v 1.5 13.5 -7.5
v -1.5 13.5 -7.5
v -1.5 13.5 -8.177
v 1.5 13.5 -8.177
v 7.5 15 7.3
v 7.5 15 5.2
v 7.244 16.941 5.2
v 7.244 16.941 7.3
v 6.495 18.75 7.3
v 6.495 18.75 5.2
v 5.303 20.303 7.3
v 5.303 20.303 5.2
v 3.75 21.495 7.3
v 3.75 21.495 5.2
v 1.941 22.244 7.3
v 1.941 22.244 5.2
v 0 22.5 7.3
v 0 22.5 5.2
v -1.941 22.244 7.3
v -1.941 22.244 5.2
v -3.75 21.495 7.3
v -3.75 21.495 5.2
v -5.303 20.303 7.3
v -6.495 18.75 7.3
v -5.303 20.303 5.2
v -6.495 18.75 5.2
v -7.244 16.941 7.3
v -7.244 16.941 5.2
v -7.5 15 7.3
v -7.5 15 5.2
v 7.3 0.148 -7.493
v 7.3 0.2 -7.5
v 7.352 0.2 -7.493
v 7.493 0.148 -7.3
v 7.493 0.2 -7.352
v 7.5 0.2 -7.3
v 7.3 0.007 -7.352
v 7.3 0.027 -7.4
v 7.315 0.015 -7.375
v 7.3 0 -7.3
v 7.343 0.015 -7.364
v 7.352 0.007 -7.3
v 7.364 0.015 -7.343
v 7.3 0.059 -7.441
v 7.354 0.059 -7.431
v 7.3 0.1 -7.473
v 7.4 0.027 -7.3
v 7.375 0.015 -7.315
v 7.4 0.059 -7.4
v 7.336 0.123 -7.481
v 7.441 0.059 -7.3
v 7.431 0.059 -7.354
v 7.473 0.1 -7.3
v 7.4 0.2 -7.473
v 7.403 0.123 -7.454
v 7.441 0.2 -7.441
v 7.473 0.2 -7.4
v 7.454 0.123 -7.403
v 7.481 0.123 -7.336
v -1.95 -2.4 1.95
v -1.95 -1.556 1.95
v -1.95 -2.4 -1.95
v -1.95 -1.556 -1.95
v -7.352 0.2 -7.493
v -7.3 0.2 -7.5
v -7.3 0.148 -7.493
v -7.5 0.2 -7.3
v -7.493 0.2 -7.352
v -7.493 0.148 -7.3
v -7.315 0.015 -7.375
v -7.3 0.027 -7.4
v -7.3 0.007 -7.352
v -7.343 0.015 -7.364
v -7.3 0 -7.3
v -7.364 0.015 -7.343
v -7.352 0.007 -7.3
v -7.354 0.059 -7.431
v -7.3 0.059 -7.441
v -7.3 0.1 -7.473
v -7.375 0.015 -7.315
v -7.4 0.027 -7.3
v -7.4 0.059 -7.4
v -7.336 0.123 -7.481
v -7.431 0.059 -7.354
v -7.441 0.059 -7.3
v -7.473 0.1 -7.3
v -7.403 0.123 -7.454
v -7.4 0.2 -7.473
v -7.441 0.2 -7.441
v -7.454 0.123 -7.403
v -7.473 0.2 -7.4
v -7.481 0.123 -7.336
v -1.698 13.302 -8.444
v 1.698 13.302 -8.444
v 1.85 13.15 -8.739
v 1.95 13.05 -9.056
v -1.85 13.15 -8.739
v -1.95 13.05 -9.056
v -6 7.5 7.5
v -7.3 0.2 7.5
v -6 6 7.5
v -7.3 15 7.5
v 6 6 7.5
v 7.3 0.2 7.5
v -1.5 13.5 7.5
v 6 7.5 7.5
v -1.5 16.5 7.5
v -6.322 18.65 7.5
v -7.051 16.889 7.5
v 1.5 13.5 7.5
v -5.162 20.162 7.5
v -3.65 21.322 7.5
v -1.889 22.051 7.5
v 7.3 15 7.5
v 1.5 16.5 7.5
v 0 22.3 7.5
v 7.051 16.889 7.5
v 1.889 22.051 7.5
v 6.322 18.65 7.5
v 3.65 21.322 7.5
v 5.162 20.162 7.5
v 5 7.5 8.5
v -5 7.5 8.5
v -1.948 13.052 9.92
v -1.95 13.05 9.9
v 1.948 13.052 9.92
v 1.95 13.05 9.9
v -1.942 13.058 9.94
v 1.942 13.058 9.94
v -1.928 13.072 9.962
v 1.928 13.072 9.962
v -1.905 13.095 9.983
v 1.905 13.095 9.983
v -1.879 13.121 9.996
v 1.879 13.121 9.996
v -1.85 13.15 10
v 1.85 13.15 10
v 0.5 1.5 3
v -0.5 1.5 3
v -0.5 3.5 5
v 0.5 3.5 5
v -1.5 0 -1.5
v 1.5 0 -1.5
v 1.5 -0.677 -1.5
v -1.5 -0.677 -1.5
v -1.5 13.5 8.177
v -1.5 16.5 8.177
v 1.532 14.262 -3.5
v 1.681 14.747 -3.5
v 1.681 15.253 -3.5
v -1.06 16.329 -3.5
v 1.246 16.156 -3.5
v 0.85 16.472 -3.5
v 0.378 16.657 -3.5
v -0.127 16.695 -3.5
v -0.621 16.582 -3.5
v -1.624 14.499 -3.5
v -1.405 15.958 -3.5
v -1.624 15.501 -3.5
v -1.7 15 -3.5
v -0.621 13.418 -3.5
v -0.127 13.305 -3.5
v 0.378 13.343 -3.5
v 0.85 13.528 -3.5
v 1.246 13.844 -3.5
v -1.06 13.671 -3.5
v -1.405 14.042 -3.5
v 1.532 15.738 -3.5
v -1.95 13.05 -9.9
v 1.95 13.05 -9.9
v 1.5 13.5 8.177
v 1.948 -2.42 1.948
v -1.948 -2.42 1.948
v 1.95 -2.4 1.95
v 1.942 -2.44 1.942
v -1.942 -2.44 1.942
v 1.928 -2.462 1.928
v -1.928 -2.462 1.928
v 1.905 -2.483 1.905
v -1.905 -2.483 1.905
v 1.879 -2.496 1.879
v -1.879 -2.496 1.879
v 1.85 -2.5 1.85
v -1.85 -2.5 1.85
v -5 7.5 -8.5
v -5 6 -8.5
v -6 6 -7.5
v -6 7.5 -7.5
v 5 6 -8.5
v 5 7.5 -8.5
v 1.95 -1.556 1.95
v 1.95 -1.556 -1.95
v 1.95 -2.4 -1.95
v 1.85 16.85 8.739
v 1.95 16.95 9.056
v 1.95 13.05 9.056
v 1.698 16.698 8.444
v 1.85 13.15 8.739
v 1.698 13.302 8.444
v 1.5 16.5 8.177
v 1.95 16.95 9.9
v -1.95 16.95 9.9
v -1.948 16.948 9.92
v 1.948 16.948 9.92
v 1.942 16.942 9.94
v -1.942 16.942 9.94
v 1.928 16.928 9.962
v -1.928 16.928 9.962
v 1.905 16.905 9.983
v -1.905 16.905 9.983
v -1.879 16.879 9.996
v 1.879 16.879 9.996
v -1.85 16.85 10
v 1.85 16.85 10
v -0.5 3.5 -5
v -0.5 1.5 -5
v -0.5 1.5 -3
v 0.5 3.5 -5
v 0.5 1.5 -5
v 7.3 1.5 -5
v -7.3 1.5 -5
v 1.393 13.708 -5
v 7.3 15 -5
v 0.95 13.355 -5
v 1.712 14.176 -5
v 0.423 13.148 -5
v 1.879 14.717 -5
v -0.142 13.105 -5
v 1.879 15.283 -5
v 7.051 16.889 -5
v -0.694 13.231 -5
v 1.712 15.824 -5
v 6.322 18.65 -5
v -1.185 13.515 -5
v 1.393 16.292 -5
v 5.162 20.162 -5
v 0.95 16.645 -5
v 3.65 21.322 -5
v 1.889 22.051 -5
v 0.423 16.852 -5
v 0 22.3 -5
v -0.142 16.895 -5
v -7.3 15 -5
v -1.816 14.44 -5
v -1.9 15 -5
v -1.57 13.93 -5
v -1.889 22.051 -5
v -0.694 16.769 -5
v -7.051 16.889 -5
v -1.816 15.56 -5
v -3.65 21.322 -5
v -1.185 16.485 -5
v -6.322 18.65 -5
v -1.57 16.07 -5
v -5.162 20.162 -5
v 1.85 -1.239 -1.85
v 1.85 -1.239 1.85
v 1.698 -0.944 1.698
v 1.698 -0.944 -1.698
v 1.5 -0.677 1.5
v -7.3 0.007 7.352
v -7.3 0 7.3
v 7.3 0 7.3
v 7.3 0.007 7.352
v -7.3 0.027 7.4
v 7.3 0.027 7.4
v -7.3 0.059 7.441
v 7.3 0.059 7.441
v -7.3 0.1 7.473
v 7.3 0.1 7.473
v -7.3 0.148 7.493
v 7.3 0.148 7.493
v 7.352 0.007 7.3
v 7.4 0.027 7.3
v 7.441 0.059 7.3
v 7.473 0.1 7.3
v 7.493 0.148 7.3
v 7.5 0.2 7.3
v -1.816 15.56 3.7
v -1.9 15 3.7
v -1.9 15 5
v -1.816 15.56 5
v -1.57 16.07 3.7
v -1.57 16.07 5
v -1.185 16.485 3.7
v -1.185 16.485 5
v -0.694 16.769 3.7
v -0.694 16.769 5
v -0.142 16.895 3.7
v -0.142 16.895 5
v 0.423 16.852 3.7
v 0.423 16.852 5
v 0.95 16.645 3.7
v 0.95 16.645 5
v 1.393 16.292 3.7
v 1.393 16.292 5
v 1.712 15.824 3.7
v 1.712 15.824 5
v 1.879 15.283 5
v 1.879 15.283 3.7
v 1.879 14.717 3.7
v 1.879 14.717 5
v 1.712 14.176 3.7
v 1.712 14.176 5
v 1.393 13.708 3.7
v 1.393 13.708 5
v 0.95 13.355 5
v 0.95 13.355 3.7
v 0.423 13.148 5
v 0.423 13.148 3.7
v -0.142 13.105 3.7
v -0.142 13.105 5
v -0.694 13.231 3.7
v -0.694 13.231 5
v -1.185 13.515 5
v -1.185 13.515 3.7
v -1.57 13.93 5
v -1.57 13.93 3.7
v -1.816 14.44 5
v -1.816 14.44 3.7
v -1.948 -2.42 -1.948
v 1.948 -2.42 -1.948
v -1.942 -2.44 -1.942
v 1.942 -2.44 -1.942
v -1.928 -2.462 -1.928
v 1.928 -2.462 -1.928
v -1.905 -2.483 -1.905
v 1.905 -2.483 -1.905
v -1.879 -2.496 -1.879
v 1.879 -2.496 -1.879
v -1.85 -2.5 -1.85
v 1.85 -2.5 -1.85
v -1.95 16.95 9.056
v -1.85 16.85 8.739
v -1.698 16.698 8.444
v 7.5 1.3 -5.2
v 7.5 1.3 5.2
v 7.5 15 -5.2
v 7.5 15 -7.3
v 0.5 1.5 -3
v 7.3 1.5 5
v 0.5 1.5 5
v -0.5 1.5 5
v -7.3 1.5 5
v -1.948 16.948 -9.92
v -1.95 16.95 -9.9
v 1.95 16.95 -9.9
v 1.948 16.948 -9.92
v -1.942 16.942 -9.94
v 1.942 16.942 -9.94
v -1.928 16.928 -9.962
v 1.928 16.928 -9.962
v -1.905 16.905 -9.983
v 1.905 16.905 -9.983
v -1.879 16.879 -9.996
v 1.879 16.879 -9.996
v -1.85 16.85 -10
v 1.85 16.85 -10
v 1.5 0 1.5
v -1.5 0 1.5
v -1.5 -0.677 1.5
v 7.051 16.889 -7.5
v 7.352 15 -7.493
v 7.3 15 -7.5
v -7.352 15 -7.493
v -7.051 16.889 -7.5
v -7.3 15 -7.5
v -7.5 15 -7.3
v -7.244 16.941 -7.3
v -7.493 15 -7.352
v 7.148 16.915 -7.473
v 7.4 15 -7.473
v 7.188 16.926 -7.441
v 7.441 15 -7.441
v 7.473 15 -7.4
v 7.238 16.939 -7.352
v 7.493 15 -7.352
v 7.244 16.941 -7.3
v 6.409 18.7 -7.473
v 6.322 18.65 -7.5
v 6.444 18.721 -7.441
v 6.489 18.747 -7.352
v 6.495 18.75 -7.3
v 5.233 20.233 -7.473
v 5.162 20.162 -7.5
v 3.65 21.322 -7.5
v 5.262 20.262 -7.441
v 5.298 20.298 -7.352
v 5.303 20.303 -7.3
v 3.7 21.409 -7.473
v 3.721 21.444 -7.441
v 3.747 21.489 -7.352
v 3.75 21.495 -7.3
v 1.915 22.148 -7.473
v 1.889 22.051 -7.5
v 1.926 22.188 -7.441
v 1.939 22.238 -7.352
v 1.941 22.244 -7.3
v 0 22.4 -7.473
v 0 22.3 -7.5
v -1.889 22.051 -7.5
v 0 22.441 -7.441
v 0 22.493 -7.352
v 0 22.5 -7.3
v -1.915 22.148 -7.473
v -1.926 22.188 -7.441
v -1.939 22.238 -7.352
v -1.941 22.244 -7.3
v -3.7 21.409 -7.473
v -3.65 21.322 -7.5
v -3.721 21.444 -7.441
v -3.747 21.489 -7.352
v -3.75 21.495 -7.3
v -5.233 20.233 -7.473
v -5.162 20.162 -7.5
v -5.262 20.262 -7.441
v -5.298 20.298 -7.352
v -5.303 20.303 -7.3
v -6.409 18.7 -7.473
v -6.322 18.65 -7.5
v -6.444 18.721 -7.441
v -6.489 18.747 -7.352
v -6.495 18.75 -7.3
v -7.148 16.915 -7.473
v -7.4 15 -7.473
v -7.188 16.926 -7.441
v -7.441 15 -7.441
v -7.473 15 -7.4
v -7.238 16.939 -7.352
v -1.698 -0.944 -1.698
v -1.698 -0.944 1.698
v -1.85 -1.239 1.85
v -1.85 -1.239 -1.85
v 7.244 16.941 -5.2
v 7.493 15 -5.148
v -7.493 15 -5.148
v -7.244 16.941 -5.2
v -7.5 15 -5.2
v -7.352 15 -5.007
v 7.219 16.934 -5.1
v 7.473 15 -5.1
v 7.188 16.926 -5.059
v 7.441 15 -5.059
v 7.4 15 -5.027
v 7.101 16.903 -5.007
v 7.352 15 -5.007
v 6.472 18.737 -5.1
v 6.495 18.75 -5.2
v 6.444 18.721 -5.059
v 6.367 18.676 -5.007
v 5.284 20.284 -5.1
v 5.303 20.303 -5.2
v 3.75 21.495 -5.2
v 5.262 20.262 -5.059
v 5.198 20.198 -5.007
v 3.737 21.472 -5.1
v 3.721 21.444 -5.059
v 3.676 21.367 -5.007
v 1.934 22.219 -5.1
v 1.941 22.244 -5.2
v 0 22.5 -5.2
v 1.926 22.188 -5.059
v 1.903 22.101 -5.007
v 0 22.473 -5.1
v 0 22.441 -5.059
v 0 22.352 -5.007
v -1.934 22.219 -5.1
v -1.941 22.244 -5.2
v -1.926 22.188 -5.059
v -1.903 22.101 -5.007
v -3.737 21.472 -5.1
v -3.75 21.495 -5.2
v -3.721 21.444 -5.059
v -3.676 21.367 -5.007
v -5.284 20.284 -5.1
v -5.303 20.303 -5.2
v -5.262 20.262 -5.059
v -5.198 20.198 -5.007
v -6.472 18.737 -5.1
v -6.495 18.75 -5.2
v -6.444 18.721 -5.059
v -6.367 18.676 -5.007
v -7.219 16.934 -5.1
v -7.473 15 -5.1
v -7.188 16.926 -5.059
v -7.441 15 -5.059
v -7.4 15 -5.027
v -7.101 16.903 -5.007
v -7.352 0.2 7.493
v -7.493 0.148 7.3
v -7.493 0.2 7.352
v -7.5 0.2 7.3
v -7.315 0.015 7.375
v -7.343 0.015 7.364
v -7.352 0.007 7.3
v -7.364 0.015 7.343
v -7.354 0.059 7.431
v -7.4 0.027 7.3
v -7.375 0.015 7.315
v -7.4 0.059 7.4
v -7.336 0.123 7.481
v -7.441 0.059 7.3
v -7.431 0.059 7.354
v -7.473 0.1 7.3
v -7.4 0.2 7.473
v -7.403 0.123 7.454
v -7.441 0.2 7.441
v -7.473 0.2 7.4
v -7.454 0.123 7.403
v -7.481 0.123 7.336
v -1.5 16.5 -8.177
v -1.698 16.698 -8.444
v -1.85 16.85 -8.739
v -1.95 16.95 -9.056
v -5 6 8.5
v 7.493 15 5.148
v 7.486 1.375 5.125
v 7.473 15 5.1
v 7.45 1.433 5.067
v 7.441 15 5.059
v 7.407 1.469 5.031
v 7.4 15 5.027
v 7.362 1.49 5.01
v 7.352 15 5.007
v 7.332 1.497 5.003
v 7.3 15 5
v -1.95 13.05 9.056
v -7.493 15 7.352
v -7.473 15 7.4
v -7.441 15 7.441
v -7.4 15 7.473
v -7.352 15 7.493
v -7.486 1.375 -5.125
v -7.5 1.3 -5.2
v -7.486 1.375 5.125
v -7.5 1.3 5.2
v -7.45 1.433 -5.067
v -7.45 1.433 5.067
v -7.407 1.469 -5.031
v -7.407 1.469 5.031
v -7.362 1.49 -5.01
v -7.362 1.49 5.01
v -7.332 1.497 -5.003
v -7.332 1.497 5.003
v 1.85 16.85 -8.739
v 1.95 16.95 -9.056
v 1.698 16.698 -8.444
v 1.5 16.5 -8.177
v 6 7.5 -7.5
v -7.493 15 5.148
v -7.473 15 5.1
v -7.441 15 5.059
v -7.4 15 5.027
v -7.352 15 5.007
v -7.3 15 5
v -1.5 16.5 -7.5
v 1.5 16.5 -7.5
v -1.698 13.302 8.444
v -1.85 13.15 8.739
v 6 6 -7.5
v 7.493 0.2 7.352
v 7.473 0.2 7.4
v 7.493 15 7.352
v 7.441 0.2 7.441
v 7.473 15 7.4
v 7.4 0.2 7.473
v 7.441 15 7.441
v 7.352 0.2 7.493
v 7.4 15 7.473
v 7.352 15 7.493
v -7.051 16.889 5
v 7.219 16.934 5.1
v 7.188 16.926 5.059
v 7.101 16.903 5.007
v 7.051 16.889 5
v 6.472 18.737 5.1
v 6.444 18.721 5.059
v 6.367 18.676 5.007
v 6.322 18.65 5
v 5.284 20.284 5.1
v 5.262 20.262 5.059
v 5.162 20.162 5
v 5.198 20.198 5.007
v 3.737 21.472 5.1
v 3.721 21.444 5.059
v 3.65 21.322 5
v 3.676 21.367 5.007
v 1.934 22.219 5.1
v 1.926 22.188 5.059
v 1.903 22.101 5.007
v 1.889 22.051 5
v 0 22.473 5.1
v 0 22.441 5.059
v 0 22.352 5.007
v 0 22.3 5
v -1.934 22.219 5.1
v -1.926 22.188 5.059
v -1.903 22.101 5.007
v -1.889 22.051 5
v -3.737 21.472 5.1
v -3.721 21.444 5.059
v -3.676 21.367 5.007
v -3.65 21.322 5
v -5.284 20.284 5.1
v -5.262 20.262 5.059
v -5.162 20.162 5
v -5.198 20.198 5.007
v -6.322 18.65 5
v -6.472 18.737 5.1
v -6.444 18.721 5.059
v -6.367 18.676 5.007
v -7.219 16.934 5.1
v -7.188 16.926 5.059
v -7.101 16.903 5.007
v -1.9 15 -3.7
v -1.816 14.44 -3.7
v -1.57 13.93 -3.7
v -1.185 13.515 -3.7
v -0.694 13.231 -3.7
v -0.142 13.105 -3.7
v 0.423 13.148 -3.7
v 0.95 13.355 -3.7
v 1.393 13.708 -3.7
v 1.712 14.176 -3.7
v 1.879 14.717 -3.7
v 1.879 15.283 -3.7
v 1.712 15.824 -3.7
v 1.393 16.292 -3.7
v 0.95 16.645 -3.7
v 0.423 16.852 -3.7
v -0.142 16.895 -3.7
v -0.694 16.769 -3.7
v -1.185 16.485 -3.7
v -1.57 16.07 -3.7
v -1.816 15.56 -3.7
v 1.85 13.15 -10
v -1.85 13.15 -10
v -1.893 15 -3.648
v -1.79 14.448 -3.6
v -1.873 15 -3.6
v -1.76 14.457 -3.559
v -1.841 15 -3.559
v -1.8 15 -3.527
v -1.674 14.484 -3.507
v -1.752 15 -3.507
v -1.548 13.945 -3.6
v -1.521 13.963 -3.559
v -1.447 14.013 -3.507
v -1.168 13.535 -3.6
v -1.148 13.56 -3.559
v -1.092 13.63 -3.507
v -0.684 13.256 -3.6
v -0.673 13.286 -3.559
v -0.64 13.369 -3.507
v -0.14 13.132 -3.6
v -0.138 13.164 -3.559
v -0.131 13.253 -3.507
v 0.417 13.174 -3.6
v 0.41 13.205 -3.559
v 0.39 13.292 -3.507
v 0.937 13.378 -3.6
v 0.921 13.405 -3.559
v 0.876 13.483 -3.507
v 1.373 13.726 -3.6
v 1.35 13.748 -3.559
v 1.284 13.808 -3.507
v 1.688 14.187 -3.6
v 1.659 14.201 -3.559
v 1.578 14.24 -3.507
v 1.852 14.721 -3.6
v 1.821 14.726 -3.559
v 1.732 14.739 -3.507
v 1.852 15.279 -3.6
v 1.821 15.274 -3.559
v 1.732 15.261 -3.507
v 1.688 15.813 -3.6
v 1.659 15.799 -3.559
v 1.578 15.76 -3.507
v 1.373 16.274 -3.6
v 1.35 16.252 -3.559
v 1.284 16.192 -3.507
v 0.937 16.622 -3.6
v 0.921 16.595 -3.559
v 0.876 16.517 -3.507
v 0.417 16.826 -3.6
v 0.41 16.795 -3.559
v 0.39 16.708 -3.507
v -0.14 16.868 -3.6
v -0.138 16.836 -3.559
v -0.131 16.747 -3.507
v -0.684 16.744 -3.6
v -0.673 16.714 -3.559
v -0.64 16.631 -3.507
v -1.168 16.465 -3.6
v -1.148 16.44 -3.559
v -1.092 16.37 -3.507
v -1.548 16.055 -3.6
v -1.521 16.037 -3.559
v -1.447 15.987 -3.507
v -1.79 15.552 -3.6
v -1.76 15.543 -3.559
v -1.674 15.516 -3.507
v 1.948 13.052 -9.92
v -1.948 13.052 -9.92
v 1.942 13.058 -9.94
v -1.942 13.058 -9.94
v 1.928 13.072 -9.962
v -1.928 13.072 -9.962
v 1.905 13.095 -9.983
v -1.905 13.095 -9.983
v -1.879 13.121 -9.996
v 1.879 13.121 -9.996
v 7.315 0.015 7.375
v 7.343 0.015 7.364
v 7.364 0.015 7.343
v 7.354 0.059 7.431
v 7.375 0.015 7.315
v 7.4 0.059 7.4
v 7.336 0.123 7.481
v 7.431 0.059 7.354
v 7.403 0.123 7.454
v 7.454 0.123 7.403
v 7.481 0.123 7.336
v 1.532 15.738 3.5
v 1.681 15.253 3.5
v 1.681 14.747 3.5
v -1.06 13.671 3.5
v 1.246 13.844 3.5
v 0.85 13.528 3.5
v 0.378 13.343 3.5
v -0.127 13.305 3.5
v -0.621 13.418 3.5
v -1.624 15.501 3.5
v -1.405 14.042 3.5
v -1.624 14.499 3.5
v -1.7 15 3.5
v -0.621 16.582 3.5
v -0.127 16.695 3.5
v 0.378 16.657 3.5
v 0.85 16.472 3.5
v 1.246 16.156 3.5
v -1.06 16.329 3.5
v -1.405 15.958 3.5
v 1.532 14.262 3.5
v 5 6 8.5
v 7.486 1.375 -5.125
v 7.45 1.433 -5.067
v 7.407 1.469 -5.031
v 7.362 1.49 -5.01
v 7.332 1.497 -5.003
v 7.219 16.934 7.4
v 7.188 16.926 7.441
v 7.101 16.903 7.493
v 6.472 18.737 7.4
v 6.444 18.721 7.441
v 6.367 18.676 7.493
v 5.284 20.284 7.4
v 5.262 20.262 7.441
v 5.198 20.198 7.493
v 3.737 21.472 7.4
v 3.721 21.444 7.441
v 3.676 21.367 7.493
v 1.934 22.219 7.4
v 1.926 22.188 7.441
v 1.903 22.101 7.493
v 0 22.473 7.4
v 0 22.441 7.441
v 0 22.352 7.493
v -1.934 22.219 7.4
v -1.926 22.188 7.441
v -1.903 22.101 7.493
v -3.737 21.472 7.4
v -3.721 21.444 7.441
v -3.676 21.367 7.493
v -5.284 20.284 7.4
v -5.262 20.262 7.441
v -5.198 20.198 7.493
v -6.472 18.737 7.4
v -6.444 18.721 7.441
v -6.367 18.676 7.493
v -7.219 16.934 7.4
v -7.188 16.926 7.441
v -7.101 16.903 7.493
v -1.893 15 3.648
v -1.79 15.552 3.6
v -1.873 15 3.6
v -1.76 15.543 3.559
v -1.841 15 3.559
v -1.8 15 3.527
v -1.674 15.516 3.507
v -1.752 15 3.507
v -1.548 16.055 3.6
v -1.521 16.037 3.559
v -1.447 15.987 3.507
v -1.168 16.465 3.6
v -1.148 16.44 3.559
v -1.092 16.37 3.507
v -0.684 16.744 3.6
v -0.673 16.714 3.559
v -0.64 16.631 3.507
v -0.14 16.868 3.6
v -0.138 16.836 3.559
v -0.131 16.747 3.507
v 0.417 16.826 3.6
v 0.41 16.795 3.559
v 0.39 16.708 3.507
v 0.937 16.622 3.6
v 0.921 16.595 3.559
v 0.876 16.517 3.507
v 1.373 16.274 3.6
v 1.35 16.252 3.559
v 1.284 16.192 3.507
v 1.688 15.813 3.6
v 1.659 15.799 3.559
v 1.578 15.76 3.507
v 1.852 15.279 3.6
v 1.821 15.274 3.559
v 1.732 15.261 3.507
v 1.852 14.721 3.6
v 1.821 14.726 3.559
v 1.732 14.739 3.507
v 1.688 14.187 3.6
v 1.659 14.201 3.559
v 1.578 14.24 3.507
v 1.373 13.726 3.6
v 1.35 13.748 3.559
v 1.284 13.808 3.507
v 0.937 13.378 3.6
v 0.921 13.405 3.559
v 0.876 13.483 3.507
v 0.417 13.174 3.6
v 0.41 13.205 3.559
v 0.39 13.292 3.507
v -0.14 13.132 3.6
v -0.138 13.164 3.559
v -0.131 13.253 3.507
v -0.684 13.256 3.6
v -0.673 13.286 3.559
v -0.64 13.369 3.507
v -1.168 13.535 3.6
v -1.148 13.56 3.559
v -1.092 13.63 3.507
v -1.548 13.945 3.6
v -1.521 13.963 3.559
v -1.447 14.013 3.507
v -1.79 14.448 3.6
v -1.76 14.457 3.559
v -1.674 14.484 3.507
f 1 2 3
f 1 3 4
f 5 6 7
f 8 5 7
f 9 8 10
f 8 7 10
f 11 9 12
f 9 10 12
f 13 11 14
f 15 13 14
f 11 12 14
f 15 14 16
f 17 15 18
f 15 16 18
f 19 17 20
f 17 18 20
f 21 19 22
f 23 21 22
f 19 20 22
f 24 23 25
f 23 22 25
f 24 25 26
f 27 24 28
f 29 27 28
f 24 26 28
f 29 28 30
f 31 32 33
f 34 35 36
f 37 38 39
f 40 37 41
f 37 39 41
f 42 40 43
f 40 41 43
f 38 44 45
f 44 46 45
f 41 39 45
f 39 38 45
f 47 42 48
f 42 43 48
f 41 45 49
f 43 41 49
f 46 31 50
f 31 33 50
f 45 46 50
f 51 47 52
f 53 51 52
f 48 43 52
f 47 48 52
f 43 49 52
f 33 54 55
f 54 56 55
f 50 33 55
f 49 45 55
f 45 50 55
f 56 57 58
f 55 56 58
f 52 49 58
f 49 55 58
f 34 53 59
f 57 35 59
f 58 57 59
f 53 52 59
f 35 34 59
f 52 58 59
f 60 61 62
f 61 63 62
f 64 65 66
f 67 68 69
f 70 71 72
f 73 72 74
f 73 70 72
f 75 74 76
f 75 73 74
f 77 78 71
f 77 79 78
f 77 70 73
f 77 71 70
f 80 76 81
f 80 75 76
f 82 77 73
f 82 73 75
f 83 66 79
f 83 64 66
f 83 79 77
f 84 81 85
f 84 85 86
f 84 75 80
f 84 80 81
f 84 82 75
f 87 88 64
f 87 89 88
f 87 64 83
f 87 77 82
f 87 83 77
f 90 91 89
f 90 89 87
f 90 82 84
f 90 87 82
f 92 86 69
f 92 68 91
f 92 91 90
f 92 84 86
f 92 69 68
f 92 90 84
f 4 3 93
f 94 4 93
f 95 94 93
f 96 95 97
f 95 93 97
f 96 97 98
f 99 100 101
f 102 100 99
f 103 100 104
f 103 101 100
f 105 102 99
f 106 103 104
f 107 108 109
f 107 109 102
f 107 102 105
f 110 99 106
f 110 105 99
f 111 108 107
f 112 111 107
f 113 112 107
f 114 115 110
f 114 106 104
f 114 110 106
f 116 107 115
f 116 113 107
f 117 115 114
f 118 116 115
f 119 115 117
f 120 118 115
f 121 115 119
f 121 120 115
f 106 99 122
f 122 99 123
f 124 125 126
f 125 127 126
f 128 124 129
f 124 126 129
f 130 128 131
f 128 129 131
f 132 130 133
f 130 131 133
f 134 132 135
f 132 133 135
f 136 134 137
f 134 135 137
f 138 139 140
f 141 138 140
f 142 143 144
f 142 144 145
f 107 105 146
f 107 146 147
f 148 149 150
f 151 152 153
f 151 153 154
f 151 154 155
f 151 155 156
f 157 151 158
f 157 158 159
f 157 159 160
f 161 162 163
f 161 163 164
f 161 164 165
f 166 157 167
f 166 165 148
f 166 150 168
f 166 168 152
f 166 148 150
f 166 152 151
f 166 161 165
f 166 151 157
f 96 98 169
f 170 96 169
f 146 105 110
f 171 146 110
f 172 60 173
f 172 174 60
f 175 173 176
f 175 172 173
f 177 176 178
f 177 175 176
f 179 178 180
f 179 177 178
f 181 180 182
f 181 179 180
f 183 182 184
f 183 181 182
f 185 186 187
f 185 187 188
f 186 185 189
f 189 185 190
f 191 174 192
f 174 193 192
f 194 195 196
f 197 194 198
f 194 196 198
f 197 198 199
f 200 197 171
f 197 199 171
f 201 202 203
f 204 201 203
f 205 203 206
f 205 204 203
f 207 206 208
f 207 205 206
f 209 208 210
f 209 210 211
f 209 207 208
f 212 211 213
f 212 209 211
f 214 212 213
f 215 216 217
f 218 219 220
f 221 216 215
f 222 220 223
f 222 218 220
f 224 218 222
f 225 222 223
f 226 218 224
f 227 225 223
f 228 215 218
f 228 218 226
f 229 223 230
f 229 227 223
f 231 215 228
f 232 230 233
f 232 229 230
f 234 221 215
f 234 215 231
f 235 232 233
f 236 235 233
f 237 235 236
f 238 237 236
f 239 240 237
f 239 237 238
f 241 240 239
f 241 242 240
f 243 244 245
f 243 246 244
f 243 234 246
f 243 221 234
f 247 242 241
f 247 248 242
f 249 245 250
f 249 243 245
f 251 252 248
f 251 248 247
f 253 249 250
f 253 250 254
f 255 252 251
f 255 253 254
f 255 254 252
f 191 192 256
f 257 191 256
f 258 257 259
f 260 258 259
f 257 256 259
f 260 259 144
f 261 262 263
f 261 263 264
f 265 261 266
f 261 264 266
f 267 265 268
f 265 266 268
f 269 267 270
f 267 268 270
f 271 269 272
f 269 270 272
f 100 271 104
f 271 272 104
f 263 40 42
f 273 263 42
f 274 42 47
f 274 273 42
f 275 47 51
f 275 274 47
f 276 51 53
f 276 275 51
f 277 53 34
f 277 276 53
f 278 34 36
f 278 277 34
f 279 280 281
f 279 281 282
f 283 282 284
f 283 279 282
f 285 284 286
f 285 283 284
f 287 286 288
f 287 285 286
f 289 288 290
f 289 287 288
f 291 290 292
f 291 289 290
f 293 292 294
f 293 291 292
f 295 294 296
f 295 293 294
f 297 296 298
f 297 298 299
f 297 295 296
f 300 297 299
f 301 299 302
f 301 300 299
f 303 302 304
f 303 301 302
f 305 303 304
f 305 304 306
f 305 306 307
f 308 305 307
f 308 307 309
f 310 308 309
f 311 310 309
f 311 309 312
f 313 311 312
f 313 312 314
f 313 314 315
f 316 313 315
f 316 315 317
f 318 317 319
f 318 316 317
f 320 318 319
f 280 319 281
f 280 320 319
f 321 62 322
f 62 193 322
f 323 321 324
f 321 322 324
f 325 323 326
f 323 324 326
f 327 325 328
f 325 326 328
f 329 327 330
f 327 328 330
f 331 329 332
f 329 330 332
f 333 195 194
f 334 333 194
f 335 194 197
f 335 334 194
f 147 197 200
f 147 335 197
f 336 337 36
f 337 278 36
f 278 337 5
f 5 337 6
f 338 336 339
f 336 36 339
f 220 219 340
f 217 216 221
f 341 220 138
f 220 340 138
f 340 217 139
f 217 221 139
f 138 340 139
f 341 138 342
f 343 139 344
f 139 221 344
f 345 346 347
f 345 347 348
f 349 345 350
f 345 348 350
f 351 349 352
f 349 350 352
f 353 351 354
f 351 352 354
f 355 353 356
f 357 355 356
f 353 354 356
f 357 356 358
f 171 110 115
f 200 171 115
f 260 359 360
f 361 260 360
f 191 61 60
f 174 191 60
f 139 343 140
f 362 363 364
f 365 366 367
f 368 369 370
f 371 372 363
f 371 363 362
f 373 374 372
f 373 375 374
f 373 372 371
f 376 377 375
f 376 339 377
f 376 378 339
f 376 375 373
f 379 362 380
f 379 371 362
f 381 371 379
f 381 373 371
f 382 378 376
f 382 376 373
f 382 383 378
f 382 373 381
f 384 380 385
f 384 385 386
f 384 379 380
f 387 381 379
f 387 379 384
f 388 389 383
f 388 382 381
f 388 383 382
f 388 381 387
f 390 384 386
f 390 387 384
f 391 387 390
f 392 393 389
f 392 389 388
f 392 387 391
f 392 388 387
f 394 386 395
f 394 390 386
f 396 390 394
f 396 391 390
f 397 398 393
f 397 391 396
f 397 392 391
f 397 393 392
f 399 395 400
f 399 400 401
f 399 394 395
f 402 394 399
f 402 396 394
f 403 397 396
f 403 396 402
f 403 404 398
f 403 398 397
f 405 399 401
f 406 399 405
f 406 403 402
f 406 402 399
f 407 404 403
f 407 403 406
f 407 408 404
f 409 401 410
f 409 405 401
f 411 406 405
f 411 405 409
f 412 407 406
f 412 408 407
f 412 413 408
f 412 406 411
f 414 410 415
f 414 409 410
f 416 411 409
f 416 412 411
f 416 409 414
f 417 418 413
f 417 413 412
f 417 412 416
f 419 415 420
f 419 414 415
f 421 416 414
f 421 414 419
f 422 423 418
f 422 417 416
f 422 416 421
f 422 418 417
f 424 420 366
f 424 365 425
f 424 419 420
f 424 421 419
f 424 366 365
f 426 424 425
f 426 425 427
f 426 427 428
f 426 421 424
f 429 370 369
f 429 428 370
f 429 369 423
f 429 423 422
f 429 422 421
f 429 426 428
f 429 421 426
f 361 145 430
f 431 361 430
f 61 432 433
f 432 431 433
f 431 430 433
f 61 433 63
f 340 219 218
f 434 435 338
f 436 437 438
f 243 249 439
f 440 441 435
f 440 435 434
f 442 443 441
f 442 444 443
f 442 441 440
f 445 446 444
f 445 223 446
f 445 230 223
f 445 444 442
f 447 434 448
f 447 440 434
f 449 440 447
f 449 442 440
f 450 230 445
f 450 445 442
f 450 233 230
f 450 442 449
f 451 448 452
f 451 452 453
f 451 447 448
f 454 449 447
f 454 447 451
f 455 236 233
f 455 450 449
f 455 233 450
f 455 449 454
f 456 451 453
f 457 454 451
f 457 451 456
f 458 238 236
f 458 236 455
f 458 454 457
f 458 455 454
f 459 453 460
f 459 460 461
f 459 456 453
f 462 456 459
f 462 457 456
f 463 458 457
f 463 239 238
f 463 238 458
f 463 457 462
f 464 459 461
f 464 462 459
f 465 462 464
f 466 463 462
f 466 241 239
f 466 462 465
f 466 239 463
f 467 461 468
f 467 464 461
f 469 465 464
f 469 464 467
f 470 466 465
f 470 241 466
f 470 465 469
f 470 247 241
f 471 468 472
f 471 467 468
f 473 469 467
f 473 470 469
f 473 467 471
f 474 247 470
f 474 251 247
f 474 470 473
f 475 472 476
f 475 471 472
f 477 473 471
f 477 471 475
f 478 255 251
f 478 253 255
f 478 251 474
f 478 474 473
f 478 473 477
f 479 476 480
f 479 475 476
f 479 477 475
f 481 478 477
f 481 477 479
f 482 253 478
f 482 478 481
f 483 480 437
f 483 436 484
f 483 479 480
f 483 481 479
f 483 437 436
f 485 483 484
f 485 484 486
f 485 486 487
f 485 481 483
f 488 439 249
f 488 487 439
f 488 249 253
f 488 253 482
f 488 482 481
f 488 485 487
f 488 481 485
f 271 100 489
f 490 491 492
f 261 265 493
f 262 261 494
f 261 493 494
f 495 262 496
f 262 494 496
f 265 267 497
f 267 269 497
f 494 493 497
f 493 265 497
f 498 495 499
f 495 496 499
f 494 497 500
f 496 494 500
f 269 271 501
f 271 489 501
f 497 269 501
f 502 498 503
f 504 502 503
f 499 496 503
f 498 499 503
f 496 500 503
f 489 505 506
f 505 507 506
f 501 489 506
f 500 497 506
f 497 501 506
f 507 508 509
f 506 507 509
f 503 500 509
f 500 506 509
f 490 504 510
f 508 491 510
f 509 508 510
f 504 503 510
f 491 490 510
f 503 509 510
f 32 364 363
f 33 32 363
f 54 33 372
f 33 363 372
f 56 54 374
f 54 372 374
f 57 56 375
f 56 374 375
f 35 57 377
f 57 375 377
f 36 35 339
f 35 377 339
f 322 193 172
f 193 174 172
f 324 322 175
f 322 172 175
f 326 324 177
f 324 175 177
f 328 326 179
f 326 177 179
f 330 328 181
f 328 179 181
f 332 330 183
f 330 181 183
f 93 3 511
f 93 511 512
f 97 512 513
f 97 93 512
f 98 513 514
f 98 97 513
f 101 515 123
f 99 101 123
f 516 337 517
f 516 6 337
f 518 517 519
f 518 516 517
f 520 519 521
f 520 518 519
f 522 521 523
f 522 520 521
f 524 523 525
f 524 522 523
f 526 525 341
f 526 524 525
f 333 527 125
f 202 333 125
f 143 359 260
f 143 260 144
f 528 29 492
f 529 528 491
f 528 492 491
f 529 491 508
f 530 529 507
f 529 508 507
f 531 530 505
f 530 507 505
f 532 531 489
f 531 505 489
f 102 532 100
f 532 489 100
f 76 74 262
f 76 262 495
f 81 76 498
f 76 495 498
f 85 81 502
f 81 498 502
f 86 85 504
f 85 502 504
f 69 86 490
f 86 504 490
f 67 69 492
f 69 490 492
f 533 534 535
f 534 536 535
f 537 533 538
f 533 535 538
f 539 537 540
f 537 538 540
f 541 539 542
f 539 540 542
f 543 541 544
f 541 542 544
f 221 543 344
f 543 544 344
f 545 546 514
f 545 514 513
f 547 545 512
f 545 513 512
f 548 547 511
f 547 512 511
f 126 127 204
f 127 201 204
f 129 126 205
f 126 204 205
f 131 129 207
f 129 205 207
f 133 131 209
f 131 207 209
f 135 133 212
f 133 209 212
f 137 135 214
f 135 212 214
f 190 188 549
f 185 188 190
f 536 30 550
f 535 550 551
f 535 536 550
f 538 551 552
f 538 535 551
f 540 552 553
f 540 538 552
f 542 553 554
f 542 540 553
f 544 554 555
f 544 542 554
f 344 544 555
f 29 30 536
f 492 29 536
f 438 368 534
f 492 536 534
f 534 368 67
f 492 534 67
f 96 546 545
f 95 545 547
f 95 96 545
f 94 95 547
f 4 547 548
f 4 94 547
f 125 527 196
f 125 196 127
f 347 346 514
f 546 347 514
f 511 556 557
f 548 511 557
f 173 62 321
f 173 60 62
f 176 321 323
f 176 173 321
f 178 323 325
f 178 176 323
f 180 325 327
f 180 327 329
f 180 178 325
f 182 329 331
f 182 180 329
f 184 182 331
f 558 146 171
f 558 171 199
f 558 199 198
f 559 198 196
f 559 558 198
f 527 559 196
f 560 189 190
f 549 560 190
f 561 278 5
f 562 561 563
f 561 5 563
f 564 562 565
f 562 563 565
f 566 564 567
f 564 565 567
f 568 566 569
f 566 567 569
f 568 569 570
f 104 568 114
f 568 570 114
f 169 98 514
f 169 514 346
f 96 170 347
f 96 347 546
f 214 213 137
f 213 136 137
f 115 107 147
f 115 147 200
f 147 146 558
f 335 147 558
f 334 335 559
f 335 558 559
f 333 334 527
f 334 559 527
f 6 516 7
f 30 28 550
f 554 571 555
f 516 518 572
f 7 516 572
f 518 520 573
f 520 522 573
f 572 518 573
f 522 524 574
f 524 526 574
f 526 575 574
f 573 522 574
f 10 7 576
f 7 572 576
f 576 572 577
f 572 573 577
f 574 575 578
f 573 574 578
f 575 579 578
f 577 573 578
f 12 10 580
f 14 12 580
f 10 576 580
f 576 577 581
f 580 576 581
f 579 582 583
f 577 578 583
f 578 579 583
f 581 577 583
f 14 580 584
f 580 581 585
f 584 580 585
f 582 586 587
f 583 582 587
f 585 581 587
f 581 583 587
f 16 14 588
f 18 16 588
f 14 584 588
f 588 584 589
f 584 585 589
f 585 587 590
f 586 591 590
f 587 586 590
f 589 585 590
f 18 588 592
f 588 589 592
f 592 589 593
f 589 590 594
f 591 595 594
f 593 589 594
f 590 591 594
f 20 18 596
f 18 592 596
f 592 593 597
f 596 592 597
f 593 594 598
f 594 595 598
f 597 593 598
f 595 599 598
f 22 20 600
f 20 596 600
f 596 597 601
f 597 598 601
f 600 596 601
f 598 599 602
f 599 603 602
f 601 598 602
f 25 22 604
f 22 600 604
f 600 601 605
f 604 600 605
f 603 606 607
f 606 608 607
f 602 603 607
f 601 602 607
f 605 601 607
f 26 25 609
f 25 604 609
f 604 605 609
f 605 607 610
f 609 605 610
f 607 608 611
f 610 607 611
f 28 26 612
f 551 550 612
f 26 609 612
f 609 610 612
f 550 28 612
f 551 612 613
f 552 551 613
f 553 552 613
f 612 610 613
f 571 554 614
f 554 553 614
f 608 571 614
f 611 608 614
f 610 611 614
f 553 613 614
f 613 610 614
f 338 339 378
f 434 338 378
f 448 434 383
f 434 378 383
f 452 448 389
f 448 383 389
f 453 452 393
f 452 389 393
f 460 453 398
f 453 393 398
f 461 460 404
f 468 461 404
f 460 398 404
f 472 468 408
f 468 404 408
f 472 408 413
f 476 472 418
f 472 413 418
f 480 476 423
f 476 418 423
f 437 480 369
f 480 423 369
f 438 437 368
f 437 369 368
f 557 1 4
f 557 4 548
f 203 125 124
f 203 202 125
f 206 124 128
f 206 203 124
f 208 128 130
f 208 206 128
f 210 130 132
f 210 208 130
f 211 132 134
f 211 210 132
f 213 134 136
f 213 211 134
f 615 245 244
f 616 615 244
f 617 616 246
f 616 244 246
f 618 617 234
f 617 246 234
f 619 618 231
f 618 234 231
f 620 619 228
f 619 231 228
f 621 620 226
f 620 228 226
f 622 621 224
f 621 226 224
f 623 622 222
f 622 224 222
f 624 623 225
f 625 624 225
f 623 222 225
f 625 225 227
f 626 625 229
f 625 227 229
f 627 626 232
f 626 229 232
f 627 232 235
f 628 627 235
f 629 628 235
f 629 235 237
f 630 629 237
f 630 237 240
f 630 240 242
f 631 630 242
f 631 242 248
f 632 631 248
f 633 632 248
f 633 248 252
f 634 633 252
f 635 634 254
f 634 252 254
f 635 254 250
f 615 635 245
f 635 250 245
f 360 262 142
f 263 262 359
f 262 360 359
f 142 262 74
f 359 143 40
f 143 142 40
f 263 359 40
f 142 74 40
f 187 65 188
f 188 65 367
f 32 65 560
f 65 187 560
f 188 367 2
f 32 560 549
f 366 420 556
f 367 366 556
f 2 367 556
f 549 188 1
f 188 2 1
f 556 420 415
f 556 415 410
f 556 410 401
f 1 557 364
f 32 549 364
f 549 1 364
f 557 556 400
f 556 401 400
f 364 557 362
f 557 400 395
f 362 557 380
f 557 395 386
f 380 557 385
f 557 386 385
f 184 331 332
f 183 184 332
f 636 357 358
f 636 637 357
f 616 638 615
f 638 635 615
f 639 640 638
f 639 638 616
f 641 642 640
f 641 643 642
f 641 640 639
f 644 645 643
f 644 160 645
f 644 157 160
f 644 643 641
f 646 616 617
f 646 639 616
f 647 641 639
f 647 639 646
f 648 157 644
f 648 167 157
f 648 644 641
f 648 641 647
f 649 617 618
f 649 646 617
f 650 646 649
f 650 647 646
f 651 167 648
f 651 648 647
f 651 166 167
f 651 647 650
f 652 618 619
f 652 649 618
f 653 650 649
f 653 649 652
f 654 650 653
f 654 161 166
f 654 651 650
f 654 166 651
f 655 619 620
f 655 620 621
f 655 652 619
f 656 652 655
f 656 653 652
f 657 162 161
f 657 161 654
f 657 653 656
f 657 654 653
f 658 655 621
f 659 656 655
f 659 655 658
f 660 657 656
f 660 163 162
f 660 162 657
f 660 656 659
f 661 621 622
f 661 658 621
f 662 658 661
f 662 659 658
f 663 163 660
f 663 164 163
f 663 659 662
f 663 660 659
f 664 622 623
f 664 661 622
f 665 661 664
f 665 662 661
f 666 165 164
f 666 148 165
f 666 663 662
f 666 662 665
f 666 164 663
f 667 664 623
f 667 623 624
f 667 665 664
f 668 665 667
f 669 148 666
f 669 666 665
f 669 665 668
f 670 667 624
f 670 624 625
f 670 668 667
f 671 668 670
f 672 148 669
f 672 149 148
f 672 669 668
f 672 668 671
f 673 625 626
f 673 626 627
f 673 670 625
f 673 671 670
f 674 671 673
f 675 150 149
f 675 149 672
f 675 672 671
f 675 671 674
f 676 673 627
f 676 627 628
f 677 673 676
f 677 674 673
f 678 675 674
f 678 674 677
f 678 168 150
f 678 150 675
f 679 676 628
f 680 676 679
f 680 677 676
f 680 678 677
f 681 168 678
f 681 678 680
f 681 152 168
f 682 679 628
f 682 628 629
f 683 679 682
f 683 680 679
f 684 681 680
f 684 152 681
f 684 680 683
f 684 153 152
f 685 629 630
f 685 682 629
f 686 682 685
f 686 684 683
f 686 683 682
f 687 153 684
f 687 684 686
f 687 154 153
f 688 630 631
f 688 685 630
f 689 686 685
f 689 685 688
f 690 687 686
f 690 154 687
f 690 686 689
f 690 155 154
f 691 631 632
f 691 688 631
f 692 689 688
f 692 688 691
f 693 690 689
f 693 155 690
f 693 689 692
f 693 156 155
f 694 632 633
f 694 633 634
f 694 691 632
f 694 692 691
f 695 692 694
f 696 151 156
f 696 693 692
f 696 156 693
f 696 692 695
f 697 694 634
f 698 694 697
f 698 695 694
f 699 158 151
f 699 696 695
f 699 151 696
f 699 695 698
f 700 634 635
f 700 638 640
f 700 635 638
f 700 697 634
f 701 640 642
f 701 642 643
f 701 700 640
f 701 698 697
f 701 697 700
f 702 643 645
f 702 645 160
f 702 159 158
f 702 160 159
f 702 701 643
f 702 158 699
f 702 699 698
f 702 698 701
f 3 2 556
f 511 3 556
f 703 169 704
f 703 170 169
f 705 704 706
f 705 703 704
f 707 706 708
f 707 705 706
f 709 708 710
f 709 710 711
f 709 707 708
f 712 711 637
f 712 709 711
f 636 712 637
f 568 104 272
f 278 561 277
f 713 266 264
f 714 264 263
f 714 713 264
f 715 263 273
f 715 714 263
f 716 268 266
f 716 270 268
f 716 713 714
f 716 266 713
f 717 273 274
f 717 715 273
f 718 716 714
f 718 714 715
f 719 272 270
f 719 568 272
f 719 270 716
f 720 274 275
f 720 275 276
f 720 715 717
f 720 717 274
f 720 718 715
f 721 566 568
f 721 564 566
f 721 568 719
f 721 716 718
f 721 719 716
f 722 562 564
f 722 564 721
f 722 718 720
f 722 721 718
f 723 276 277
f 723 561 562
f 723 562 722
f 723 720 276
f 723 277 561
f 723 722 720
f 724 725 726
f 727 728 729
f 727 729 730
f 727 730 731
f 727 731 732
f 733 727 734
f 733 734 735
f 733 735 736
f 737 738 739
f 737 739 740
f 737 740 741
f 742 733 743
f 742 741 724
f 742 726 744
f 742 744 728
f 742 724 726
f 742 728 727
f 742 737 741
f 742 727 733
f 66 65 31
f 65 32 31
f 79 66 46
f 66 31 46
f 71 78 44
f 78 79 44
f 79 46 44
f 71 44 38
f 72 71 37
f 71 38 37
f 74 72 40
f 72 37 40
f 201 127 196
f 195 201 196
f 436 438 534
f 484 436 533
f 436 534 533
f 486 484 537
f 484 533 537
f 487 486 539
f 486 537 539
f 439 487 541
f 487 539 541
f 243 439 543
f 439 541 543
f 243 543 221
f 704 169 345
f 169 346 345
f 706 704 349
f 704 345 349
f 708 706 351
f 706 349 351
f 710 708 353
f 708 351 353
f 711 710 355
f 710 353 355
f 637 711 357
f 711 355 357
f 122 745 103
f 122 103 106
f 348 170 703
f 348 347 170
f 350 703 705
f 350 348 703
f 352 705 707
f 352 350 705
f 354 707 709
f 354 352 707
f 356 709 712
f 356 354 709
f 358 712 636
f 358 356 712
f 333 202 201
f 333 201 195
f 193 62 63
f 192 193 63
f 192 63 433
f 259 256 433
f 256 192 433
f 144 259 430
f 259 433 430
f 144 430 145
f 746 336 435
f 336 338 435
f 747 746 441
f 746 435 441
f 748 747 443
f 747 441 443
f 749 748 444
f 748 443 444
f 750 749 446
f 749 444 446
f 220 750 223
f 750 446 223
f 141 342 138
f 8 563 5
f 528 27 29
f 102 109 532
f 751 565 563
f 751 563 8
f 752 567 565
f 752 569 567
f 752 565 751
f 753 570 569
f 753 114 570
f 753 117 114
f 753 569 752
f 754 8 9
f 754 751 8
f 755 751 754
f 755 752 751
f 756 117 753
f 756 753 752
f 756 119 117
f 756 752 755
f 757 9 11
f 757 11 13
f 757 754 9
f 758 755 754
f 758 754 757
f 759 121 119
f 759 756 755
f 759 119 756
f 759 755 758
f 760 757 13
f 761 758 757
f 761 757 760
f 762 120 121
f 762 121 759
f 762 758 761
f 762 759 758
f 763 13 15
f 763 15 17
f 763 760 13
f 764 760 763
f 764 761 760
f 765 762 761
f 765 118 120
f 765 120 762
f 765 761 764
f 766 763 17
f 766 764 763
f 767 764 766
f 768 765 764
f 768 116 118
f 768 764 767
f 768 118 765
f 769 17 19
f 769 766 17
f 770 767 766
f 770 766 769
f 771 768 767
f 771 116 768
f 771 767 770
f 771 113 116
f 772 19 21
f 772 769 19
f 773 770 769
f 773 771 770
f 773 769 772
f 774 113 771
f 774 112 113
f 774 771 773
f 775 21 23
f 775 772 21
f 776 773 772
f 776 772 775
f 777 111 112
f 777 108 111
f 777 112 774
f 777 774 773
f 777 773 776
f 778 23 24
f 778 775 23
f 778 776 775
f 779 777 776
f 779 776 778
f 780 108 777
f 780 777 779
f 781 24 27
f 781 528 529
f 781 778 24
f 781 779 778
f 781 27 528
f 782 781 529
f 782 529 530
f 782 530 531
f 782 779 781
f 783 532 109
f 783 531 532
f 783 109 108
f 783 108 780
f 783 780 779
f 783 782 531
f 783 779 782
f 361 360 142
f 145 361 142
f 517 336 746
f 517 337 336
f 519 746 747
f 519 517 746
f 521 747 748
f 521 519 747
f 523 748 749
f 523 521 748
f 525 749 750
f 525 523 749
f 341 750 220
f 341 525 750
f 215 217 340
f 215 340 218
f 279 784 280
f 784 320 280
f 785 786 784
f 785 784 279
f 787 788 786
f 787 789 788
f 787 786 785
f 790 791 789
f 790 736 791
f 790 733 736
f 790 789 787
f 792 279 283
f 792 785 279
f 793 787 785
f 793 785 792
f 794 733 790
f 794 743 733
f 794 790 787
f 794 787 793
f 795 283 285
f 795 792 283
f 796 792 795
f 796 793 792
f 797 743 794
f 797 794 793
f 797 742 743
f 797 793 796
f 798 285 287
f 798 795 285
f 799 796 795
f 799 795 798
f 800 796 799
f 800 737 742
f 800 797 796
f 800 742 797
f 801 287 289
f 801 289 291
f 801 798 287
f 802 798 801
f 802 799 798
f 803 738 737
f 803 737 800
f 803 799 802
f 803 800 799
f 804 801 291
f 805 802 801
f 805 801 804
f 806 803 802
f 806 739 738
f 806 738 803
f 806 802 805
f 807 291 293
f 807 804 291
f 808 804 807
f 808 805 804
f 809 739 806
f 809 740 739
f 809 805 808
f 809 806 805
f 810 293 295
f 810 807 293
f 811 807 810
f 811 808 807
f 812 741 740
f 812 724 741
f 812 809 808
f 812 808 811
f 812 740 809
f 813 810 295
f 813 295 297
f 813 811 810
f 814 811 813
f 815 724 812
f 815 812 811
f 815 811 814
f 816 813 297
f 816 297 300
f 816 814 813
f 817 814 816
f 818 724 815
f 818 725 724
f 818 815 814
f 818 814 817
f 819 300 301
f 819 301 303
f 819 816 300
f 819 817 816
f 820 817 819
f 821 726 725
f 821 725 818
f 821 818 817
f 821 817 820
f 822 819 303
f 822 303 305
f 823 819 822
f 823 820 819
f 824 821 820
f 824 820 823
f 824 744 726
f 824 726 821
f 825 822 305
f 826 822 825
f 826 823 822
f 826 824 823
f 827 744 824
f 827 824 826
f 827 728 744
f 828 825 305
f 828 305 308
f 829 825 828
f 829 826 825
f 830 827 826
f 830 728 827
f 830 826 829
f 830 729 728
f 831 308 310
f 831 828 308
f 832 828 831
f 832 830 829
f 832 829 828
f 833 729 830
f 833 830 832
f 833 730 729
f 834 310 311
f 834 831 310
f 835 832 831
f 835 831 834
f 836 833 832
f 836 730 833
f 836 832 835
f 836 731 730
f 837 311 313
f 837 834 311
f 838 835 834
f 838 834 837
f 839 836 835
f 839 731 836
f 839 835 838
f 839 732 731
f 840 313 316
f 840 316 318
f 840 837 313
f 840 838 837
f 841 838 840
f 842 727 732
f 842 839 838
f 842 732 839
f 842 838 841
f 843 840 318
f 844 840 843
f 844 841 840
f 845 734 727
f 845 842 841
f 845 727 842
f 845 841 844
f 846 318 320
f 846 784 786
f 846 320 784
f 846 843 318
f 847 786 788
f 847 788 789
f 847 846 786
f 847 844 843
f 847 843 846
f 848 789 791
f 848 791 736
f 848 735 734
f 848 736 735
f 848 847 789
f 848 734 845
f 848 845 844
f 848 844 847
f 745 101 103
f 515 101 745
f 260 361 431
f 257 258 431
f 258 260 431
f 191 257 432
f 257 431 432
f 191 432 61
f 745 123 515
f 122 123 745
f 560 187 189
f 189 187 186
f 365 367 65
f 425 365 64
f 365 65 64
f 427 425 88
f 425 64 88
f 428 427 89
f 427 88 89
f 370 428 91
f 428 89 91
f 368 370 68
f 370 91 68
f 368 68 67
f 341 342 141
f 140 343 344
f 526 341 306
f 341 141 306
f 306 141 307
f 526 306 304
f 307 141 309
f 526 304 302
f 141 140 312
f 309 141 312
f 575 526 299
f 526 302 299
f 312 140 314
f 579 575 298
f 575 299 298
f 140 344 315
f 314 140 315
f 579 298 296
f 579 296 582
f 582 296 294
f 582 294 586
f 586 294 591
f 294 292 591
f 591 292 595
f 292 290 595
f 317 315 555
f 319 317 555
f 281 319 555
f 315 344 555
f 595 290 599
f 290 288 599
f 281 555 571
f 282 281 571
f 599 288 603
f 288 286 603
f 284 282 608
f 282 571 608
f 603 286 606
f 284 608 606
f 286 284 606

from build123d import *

# Parameters (mm, degrees)
EXTRUDE_1_DEPTH            = 7.5
EXTRUDE_1_DEPTH_BACK       = 7.5
SKETCH_3_W                 = 10
SKETCH_3_H                 = 21
CUT_EXTRUDE_1_DEPTH        = 29.062430401
SKETCH_4_W                 = 3
SKETCH_4_H                 = 3
EXTRUDE_2_DEPTH            = 1
EXTRUDE_3_DEPTH            = 2
EXTRUDE_3_DEPTH_BACK       = 2
CUT_EXTRUDE_2_REACH        = 27.53
SKETCH_7_W                 = 3
SKETCH_7_H                 = 3
EXTRUDE_4_DEPTH            = 1
EXTRUDE_START              = -4
EXTRUDE_5_DEPTH            = 5
CUT_EXTRUDE_3_REACH        = 28.373
SKETCH_10_R                = 1.9
EXTRUDE_6_DEPTH            = 1.5
EXTRUDE_START_2            = 1.5
SKETCH_11_R                = 1.9
EXTRUDE_7_DEPTH            = 1.5
EXTRUDE_8_DEPTH            = 0.5
EXTRUDE_8_DEPTH_BACK       = 0.5
SKETCH_13_W                = 12
SKETCH_13_H                = 1.5
EXTRUDE_9_DEPTH            = 1
CHAMFER_1_SIZE             = 1
CHAMFER_1_OF_MIRROR_2_SIZE = 1
FILLET_1_R                 = 0.1
FILLET_2_R                 = 0.2
FILLET_3_R                 = 0.2
FILLET_4_R                 = 0.1


with BuildPart() as part:
    # 草图1 → 凸台-拉伸1 (new, two sides: drawn at the far end of the back side and taken through both)
    with BuildSketch(Plane.XY.offset(-EXTRUDE_1_DEPTH_BACK)):
        with BuildLine():
            Line((-7.5, 0), (7.5, 0))
            Line((7.5, 0), (7.5, 15))
            ThreePointArc((7.5, 15), (0, 22.5), (-7.5, 15))
            Line((-7.5, 15), (-7.5, 0))
        make_face()
    extrude(amount=EXTRUDE_1_DEPTH + EXTRUDE_1_DEPTH_BACK)

    # 草图3 → 切除-拉伸1 (cut, through all)
    with BuildSketch(Plane.ZY.offset(7.5)):
        with Locations((0, 12)):
            Rectangle(SKETCH_3_W, SKETCH_3_H)
    extrude(amount=-CUT_EXTRUDE_1_DEPTH, mode=Mode.SUBTRACT)

    # 草图4 → 凸台-拉伸2 (add)
    with BuildSketch(Plane(origin=(0, 0, 0), x_dir=(-1, 0, 0), z_dir=(0, -1, 0))):
        Rectangle(SKETCH_4_W, SKETCH_4_H)
    extrude(amount=EXTRUDE_2_DEPTH)

    # 草图5 → 凸台-拉伸3 (add, two sides: drawn at the far end of the back side and taken through both)
    with BuildSketch(Plane.XY.offset(-EXTRUDE_3_DEPTH_BACK)):
        with BuildLine():
            Line((-1.95, -2.5), (1.95, -2.5))
            Line((1.95, -2.5), (1.95, -1.555590279))
            ThreePointArc((1.95, -1.555590279), (1.780042303, -1.088161527), (1.5, -0.677124344))
            Line((1.5, -0.677124344), (-1.5, -0.677124344))
            ThreePointArc((-1.5, -0.677124344), (-1.780042303, -1.088161527), (-1.95, -1.555590279))
            Line((-1.95, -1.555590279), (-1.95, -2.5))
        make_face()
    extrude(amount=EXTRUDE_3_DEPTH + EXTRUDE_3_DEPTH_BACK)

    # 草图6 → 切除-拉伸2 (cut, up to next)
    with BuildSketch(Plane.ZY.offset(1.95), mode=Mode.PRIVATE) as cut_extrude_2_sk1:
        with BuildLine():
            Line((-1.95, -2.5), (-1.95, -1.555590279))
            ThreePointArc((-1.95, -1.555590279), (-1.780042303, -1.088161527), (-1.5, -0.677124344))
            Line((-1.5, -0.677124344), (-2, -0.677124344))
            Line((-2, -0.677124344), (-2, -2.5))
            Line((-2, -2.5), (-1.95, -2.5))
        make_face()
    cut_extrude_2_tool1 = extrude(cut_extrude_2_sk1.sketch, amount=-CUT_EXTRUDE_2_REACH, mode=Mode.PRIVATE) & part.part
    # 草图6 → 切除-拉伸2 (cut, up to next)
    with BuildSketch(Plane.ZY.offset(1.95), mode=Mode.PRIVATE) as cut_extrude_2_sk2:
        with BuildLine():
            Line((2, -2.5), (2, -0.677124344))
            Line((2, -0.677124344), (1.5, -0.677124344))
            ThreePointArc((1.5, -0.677124344), (1.780042303, -1.088161527), (1.95, -1.555590279))
            Line((1.95, -1.555590279), (1.95, -2.5))
            Line((1.95, -2.5), (2, -2.5))
        make_face()
    cut_extrude_2_tool2 = extrude(cut_extrude_2_sk2.sketch, amount=-CUT_EXTRUDE_2_REACH, mode=Mode.PRIVATE) & part.part
    add(cut_extrude_2_tool1.solids().sort_by_distance((-1.95, -1.175075, -1.873038))[0], mode=Mode.SUBTRACT)
    add(cut_extrude_2_tool2.solids().sort_by_distance((-1.95, -1.175075, 1.873038))[0], mode=Mode.SUBTRACT)

    # 草图7 → 凸台-拉伸4 (add)
    with BuildSketch(Plane.XY.offset(7.5)):
        with Locations((0, 15)):
            Rectangle(SKETCH_7_W, SKETCH_7_H)
    extrude_4 = extrude(amount=EXTRUDE_4_DEPTH)

    # 草图8 → 凸台-拉伸5 (add)
    with BuildSketch(Plane(origin=(0, 16.5, 0), x_dir=(1, 0, 0), z_dir=(0, 1, 0)).offset(EXTRUDE_START)):
        with BuildLine():
            Line((-1.95, -10), (1.95, -10))
            Line((1.95, -10), (1.95, -9.055590279))
            ThreePointArc((1.95, -9.055590279), (1.780042303, -8.588161527), (1.5, -8.177124344))
            Line((1.5, -8.177124344), (-1.5, -8.177124344))
            ThreePointArc((-1.5, -8.177124344), (-1.780042303, -8.588161527), (-1.95, -9.055590279))
            Line((-1.95, -9.055590279), (-1.95, -10))
        make_face()
    extrude_5 = extrude(amount=EXTRUDE_5_DEPTH)

    # 草图9 → 切除-拉伸3 (cut, up to next)
    with BuildSketch(Plane.ZY.offset(1.95), mode=Mode.PRIVATE) as cut_extrude_3_sk1:
        with BuildLine():
            Line((10, 16.95), (9.055590279, 16.95))
            ThreePointArc((9.055590279, 16.95), (8.588161527, 16.780042303), (8.177124344, 16.5))
            Line((8.177124344, 16.5), (8.177124344, 17.5))
            Line((8.177124344, 17.5), (10, 17.5))
            Line((10, 17.5), (10, 16.95))
        make_face()
    cut_extrude_3_tool1 = extrude(cut_extrude_3_sk1.sketch, amount=-CUT_EXTRUDE_3_REACH, mode=Mode.PRIVATE) & part.part
    # 草图9 → 切除-拉伸3 (cut, up to next)
    with BuildSketch(Plane.ZY.offset(1.95), mode=Mode.PRIVATE) as cut_extrude_3_sk2:
        with BuildLine():
            Line((10, 12.5), (8.177124344, 12.5))
            Line((8.177124344, 12.5), (8.177124344, 13.5))
            ThreePointArc((8.177124344, 13.5), (8.588161527, 13.219957697), (9.055590279, 13.05))
            Line((9.055590279, 13.05), (10, 13.05))
            Line((10, 13.05), (10, 12.5))
        make_face()
    cut_extrude_3_tool2 = extrude(cut_extrude_3_sk2.sketch, amount=-CUT_EXTRUDE_3_REACH, mode=Mode.PRIVATE) & part.part
    cut_extrude_3_1 = cut_extrude_3_tool1.solids().sort_by_distance((-1.95, 17.169375, 9.000125))[0]
    add(cut_extrude_3_1, mode=Mode.SUBTRACT)
    cut_extrude_3_2 = cut_extrude_3_tool2.solids().sort_by_distance((-1.95, 12.830625, 9.000125))[0]
    add(cut_extrude_3_2, mode=Mode.SUBTRACT)
    cut_extrude_3 = cut_extrude_3_1 + cut_extrude_3_2  # 切除-拉伸3 as one shape, for the pattern or mirror that repeats it

    # 草图10 → 凸台-拉伸6 (add)
    with BuildSketch(Plane.XY.offset(-5)):
        with Locations(Location((0, 15, 0), (0, 0, 180))):
            Circle(SKETCH_10_R)
    extrude(amount=EXTRUDE_6_DEPTH)

    # 草图11 → 凸台-拉伸7 (add)
    with BuildSketch(Plane(origin=(0, 0, 5), x_dir=(-1, 0, 0), z_dir=(0, 0, -1)).offset(EXTRUDE_START_2)):
        with Locations((0, 15)):
            Circle(SKETCH_11_R)
    extrude(amount=-EXTRUDE_7_DEPTH)

    # 镜向1: 凸台-拉伸4, 凸台-拉伸5, 切除-拉伸3 across plane
    add(extrude_4.mirror(Plane.XY))
    add(extrude_5.mirror(Plane.XY))
    add(cut_extrude_3.mirror(Plane.XY), mode=Mode.SUBTRACT)

    # 草图12 → 凸台-拉伸8 (add, two sides: drawn at the far end of the back side and taken through both)
    with BuildSketch(Plane(origin=(0, 0, 0), x_dir=(0, 0, -1), z_dir=(1, 0, 0)).offset(-EXTRUDE_8_DEPTH_BACK)):
        Polygon((5, 1.5), (3, 1.5), (5, 3.5), align=None)
        Polygon((-5, 1.5), (-3, 1.5), (-5, 3.5), align=None)
    extrude(amount=EXTRUDE_8_DEPTH + EXTRUDE_8_DEPTH_BACK)

    # 草图13 → 凸台-拉伸9 (add)
    with BuildSketch(Plane.XY.offset(7.5)):
        with Locations((0, 6.75)):
            Rectangle(SKETCH_13_W, SKETCH_13_H)
    extrude_9 = extrude(amount=EXTRUDE_9_DEPTH)

    # 倒角1
    chamfer_1_edges = [part.edges().sort_by_distance(p)[0] for p in [
        (-6, 6.75, 8.5),
        (6, 6.75, 8.5),
    ]]
    chamfer(chamfer_1_edges, length=CHAMFER_1_SIZE - 0.0001)  # a hair under: the kernel refuses the full size

    # 镜向2: 凸台-拉伸9 across plane
    add(extrude_9.mirror(Plane.XY))

    # 倒角1 of 镜向2
    chamfer_1_of_mirror_2_edges = [part.edges().sort_by_distance(p)[0] for p in [
        (-6, 6.75, -8.5),
        (6, 6.75, -8.5),
    ]]
    chamfer(chamfer_1_of_mirror_2_edges, length=CHAMFER_1_OF_MIRROR_2_SIZE - 0.0001)  # a hair under: the kernel refuses the full size

    # 圆角1
    fillet_1_edges = [part.edges().sort_by_distance(p)[0] for p in [
        (0, 16.95, 10),
        (-1.95, 15, 10),
        (1.95, 15, 10),
        (0, 13.05, 10),
        (0, 16.95, -10),
        (1.95, 15, -10),
        (-1.95, 15, -10),
        (0, 13.05, -10),
    ]]
    fillet(fillet_1_edges, radius=FILLET_1_R)

    # 圆角2
    fillet_2_edges = [part.edges().sort_by_distance(p)[0] for p in [
        (7.5, 7.5, -7.5),
        (-7.5, 7.5, 7.5),
        (0, 0, 7.5),
        (0, 22.5, -7.5),
        (7.5, 7.5, 7.5),
        (0, 22.5, 7.5),
        (7.5, 8.25, -5),
        (0, 22.5, -5),
        (0, 22.5, 5),
        (7.5, 8.25, 5),
        (7.5, 1.5, 0),
        (-7.5, 8.25, 5),
        (-7.5, 8.25, -5),
        (-7.5, 1.5, 0),
        (-7.5, 7.5, -7.5),
        (0, 0, -7.5),
        (7.5, 0, 0),
        (-7.5, 0, 0),
    ]]
    fillet(fillet_2_edges, radius=FILLET_2_R)

    # 圆角3
    fillet_3_edges = [part.edges().sort_by_distance(p)[0] for p in [
        (1.9, 15, -3.5),
        (1.9, 15, 3.5),
    ]]
    fillet(fillet_3_edges, radius=FILLET_3_R)

    # 圆角4
    fillet_4_edges = [part.edges().sort_by_distance(p)[0] for p in [
        (1.95, -2.5, 0),
        (-1.95, -2.5, 0),
        (0, -2.5, -1.95),
        (0, -2.5, 1.95),
    ]]
    fillet(fillet_4_edges, radius=FILLET_4_R)


solid = part.part
